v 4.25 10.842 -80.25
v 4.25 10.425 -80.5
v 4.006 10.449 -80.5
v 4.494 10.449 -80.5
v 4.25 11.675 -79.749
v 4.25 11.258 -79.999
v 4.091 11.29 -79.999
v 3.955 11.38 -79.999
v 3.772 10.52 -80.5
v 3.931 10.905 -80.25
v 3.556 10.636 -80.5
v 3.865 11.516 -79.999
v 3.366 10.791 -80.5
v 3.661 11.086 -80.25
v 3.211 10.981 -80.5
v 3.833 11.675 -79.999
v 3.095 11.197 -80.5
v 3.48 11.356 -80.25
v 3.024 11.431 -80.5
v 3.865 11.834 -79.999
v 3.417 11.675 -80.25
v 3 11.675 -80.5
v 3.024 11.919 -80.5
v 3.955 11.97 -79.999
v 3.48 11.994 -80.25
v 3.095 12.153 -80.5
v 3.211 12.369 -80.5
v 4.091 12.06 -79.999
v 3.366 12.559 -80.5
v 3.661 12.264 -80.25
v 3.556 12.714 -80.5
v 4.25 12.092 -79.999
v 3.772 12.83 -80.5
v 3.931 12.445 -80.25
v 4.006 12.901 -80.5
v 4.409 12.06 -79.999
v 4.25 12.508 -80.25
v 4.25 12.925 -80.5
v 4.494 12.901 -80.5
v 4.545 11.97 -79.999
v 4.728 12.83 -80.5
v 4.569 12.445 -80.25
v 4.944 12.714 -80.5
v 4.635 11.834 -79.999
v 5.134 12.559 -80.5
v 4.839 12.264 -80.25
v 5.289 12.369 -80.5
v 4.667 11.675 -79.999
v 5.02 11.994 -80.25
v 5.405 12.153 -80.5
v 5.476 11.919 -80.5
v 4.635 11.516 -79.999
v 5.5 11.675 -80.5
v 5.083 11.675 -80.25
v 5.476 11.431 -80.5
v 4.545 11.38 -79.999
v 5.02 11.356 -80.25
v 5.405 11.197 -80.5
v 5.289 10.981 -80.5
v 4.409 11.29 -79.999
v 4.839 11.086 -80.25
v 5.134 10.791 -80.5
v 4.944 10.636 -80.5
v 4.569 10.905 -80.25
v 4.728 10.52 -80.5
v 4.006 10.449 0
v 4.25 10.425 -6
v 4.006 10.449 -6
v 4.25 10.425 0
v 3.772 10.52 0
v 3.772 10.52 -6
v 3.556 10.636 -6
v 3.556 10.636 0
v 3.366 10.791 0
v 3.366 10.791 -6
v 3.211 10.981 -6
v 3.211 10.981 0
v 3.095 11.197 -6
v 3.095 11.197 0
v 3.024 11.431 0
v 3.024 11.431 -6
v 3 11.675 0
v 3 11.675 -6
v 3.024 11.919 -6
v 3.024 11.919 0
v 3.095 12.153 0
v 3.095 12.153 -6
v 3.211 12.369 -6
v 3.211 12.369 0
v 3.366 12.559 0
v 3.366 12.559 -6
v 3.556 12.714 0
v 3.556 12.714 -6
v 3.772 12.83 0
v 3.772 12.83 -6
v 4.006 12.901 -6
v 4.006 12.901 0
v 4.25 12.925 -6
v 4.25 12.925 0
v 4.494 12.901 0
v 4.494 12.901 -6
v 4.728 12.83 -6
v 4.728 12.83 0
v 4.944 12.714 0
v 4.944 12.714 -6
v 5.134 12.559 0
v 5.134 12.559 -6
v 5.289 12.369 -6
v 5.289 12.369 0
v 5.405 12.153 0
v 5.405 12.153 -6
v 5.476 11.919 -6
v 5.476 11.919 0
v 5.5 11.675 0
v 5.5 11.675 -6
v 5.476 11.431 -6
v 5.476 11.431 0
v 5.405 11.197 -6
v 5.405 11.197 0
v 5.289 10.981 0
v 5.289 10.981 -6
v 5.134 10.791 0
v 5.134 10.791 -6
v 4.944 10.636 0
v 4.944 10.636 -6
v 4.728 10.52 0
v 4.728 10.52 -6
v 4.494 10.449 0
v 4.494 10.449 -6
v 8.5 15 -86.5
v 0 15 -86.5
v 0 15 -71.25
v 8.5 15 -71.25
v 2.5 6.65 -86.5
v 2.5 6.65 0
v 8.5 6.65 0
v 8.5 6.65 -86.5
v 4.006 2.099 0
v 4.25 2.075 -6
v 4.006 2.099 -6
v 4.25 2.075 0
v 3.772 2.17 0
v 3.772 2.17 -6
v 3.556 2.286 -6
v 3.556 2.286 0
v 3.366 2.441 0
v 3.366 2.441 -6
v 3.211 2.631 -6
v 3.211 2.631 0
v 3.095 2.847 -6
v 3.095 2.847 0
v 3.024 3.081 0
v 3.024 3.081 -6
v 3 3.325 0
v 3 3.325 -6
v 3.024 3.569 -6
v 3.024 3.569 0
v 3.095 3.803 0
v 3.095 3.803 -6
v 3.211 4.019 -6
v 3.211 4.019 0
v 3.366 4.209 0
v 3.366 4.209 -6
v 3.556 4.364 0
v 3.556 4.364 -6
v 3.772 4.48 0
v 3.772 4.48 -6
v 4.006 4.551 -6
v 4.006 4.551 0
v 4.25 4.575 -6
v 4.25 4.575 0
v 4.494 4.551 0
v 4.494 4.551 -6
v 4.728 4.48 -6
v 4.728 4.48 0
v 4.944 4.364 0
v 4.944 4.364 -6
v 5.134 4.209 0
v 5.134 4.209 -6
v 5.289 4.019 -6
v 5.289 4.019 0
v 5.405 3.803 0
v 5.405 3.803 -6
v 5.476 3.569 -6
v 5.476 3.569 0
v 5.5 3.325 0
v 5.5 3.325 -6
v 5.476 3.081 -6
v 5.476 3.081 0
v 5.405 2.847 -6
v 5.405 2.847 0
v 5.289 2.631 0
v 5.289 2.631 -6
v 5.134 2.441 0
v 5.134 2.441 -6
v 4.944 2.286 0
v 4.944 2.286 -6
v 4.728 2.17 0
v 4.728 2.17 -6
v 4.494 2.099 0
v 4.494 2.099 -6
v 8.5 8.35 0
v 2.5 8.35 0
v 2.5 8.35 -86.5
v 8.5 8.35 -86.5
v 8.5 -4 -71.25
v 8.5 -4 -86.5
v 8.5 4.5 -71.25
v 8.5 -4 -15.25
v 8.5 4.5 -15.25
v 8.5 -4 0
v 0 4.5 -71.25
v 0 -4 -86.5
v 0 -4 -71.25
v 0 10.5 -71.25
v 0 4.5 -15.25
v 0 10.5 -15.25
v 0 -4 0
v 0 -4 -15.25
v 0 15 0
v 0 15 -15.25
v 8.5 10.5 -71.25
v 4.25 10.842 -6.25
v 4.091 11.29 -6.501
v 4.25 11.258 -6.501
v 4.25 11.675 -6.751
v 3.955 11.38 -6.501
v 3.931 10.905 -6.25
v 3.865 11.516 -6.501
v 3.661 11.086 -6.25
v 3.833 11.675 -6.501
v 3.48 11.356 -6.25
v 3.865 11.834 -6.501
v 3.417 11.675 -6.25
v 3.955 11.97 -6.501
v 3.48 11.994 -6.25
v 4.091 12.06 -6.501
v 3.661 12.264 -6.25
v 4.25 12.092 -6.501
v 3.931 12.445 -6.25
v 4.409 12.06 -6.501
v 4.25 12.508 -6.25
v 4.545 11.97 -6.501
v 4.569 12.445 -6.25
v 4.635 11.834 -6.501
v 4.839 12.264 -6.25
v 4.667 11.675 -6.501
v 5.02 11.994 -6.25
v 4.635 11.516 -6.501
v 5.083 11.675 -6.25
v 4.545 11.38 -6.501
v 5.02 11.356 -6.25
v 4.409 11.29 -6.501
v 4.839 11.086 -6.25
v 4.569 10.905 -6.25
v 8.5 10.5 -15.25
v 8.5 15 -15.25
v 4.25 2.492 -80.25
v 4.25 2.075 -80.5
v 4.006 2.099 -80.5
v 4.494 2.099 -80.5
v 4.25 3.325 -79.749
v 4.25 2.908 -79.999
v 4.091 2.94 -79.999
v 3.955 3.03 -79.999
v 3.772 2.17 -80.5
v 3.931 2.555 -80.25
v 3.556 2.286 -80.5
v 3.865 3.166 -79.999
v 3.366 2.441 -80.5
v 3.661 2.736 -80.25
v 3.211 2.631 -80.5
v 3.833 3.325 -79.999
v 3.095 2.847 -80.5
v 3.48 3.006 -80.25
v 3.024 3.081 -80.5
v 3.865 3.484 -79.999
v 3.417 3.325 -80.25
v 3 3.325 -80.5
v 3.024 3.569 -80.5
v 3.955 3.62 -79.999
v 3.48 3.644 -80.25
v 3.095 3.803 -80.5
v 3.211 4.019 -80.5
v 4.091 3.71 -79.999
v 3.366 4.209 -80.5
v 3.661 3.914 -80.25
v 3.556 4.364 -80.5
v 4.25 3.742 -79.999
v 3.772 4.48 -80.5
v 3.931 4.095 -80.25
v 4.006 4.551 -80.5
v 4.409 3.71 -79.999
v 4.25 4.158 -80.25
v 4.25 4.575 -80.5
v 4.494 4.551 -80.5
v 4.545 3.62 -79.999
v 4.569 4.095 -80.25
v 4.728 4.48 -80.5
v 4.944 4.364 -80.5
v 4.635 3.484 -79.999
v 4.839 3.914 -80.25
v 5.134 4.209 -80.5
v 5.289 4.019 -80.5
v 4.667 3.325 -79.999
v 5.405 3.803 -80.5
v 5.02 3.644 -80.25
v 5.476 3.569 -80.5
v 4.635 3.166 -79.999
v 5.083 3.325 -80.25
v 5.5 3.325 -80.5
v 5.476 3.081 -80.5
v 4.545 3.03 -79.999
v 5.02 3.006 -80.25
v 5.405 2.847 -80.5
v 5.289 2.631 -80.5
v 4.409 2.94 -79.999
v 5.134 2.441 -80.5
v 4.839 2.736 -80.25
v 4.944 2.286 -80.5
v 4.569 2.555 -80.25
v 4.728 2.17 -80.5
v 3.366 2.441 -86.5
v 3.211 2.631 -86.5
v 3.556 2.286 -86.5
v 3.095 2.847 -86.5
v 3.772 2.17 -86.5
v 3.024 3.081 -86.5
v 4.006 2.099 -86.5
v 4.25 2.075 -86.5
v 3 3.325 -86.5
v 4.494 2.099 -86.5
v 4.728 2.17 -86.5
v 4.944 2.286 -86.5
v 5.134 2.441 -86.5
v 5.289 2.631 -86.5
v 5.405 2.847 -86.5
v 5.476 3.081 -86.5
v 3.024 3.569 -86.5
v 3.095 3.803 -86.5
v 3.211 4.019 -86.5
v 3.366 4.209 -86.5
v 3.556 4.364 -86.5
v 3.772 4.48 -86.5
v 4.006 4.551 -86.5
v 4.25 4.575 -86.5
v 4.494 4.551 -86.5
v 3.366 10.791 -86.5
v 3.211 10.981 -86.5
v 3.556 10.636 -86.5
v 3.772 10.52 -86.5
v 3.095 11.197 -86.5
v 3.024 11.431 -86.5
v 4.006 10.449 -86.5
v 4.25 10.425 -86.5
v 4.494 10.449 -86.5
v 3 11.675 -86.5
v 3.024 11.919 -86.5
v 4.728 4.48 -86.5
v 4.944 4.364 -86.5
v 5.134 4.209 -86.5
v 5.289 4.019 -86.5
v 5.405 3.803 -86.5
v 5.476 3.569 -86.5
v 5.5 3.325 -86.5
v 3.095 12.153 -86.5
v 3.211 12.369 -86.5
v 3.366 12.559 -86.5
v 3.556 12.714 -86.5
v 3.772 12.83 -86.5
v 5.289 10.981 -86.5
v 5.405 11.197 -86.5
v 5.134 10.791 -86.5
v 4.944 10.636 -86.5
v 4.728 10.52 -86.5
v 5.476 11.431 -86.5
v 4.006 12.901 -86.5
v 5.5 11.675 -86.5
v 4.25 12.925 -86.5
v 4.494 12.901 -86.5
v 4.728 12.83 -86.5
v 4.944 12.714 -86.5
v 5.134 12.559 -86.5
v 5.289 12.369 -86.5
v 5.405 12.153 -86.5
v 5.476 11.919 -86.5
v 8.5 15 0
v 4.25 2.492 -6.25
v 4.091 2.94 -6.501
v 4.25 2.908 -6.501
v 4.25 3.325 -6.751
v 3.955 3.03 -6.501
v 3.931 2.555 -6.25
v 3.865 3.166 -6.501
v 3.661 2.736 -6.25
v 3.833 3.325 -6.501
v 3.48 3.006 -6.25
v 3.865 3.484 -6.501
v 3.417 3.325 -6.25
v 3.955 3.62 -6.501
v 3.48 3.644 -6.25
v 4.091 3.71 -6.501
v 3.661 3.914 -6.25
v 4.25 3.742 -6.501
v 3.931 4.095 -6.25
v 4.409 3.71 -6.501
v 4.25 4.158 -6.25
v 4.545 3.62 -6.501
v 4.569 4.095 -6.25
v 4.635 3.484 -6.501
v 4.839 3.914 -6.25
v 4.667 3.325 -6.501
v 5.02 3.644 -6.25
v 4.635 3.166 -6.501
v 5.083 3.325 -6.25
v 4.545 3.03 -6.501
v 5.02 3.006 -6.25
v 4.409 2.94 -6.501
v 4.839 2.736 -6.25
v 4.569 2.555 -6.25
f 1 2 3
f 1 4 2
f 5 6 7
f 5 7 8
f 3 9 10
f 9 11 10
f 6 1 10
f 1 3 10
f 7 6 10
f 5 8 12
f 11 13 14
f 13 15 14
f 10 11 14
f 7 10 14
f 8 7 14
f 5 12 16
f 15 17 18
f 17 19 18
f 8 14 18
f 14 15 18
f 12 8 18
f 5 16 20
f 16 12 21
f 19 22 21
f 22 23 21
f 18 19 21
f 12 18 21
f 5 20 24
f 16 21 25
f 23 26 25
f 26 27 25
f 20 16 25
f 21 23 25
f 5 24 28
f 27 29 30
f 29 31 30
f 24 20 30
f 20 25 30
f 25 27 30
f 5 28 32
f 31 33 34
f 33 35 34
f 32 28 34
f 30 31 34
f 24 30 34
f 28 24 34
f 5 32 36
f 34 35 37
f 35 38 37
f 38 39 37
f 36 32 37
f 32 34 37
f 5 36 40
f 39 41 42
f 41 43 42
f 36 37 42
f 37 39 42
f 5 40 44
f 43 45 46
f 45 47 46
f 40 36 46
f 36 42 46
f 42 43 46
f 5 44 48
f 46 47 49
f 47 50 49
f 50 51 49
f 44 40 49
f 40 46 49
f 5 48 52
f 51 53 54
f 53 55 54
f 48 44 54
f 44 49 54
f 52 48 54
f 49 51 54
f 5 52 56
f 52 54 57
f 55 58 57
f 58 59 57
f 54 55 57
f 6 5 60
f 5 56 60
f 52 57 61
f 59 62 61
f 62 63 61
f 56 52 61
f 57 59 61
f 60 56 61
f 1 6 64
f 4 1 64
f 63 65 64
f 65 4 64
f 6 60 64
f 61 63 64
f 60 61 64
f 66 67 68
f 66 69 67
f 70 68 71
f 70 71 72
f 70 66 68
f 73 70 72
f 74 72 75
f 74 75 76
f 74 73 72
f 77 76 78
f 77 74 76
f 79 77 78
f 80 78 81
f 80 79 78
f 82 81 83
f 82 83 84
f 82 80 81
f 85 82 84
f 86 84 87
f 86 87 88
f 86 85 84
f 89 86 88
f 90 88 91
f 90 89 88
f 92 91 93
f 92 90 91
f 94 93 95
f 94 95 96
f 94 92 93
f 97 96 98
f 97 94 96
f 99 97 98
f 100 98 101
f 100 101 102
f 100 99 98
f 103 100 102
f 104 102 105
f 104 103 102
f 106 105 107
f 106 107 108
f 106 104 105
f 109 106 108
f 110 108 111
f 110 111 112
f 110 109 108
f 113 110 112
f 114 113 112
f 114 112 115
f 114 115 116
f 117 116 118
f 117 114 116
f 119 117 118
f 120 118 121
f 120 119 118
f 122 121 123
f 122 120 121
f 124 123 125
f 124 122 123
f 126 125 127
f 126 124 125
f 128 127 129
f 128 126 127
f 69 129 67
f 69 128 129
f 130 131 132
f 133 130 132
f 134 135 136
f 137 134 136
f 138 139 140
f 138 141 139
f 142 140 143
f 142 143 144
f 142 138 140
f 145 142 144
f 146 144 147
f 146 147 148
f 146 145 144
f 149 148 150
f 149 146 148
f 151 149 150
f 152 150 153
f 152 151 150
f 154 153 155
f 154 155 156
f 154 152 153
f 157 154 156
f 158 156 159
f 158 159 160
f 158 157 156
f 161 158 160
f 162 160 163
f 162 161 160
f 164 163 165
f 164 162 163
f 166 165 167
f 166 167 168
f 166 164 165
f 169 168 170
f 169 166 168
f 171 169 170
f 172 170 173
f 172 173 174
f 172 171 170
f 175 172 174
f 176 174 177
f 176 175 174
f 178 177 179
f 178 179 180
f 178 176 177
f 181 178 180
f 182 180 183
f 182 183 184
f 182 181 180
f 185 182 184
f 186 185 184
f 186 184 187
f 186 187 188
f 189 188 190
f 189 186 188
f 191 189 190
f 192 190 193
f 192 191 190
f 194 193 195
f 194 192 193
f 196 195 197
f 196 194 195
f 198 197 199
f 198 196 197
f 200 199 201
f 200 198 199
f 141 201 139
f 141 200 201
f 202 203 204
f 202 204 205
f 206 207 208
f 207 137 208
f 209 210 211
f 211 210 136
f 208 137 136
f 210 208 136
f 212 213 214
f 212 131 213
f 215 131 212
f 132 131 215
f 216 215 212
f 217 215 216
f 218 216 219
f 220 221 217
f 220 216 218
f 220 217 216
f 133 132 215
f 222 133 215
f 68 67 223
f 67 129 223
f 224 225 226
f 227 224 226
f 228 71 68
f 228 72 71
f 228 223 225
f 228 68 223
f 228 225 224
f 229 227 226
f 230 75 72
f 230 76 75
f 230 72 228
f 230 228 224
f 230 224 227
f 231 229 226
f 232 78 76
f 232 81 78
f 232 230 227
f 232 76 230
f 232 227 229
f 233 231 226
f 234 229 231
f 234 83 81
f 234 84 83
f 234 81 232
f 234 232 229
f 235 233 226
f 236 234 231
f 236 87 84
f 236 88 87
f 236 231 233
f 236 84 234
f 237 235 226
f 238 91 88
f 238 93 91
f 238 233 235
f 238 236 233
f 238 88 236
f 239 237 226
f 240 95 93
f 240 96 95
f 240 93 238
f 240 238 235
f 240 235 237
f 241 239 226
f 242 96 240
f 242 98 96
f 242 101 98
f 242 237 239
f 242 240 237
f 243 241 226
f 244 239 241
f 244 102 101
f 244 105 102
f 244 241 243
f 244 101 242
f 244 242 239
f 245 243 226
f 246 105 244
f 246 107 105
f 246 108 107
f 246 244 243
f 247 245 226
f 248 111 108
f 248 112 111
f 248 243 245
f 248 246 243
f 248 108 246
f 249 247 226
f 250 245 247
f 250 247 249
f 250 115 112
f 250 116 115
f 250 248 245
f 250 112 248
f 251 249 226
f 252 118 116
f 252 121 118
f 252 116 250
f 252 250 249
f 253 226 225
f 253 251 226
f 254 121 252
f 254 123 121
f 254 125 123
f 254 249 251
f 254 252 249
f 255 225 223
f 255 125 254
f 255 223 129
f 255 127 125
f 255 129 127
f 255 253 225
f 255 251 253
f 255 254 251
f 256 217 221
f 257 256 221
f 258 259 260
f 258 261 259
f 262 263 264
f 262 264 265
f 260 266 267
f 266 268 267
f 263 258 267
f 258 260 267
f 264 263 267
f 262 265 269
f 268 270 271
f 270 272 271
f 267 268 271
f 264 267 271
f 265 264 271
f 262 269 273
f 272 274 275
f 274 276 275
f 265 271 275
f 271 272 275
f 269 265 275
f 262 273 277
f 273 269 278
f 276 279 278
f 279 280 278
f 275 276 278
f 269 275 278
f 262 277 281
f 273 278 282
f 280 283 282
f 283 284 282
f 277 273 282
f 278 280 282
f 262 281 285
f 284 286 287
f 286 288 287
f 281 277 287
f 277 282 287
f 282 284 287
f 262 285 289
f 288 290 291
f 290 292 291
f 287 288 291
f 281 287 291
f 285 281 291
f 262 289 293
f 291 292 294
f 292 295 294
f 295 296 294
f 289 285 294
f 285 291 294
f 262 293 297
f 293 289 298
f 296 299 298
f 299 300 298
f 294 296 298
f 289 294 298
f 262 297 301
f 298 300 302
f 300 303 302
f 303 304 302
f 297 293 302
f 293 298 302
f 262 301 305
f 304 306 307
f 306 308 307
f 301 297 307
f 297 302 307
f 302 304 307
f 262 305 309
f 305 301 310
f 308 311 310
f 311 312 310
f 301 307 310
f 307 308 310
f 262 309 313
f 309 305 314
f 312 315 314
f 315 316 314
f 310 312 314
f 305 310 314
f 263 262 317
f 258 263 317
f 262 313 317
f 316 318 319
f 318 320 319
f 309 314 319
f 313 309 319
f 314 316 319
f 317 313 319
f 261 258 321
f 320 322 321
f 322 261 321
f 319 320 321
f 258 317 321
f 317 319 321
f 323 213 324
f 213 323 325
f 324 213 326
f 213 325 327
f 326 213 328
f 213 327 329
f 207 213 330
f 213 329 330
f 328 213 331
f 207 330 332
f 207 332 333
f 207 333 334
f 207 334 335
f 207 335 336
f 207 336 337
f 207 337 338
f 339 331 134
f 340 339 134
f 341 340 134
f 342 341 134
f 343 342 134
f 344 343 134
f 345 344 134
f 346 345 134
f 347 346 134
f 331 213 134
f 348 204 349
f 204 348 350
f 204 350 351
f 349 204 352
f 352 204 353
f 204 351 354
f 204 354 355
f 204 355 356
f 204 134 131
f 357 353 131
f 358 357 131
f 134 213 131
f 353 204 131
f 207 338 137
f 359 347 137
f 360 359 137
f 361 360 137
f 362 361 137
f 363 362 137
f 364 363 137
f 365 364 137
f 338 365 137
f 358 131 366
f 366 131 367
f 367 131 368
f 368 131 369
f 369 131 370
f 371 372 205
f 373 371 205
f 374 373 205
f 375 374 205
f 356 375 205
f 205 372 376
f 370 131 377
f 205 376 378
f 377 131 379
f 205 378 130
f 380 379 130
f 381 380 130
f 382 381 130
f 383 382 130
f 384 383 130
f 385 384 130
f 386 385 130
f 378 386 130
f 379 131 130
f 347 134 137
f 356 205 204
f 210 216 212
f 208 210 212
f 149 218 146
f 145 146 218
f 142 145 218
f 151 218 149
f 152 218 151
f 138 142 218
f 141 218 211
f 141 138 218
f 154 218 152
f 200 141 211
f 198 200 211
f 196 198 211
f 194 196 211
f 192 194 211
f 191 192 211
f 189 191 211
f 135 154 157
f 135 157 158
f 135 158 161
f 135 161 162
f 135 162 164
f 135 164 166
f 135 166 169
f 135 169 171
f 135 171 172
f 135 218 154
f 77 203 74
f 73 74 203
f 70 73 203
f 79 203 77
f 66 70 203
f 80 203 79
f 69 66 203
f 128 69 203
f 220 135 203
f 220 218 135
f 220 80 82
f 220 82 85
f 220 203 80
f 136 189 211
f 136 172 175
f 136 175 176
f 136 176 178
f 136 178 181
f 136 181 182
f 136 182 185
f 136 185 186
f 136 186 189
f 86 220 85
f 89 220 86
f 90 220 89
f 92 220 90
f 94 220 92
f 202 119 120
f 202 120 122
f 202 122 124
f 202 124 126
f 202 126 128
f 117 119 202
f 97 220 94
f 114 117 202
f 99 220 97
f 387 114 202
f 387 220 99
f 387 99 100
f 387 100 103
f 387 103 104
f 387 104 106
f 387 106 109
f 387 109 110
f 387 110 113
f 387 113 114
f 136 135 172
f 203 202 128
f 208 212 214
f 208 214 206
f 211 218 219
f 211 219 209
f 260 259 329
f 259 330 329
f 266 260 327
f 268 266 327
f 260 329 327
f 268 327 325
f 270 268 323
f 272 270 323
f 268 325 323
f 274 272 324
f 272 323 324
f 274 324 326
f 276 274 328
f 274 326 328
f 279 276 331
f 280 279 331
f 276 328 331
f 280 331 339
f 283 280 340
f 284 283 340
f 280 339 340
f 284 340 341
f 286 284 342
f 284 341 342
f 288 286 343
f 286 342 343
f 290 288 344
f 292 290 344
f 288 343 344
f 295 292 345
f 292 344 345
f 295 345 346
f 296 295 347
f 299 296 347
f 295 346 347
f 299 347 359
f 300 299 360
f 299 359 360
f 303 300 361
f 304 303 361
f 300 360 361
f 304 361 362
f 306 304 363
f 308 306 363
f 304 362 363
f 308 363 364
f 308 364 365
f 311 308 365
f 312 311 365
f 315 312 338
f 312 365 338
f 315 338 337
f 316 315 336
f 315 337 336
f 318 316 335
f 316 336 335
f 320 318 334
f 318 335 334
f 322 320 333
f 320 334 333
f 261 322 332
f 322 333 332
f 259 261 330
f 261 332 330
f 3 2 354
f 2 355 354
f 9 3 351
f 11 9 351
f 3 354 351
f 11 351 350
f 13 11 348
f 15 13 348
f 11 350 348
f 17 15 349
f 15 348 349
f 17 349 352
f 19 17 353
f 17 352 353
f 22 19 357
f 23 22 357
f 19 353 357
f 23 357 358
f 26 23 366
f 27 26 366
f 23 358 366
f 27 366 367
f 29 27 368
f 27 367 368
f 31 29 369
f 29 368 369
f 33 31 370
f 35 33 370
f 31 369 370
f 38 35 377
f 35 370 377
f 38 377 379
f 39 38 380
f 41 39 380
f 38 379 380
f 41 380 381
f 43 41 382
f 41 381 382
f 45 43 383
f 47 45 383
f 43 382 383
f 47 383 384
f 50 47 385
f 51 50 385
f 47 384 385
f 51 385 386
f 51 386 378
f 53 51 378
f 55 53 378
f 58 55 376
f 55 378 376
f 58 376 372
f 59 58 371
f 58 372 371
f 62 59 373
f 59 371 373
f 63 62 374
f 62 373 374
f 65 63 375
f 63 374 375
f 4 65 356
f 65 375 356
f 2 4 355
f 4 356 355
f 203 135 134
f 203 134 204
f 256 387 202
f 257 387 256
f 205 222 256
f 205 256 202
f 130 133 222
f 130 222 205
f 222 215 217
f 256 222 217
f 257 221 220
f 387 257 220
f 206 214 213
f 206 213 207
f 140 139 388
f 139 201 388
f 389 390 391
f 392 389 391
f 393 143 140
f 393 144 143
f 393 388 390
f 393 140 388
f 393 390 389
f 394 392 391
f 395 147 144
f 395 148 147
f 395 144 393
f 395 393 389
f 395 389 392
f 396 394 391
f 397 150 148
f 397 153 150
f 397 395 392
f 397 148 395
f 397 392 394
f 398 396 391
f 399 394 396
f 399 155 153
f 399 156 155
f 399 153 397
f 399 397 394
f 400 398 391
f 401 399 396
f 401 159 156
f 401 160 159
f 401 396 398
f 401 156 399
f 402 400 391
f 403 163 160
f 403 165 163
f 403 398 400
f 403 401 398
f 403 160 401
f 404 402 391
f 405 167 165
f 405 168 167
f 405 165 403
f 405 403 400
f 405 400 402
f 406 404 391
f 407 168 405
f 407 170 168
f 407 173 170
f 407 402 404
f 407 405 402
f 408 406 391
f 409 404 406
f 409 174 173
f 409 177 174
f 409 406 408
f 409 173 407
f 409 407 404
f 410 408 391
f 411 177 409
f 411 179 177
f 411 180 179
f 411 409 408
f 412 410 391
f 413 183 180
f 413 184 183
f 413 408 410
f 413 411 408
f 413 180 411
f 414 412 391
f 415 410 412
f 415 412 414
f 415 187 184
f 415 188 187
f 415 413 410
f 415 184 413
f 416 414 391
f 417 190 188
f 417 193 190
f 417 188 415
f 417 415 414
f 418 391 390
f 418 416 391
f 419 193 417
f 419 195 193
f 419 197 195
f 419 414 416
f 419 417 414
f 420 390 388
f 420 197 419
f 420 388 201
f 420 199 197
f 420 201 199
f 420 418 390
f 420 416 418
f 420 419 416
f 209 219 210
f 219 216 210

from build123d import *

# Parameters (mm, degrees)
BOSS_EXTRUDE2_DEPTH            = 8.5
SKETCH6_W                      = 6
SKETCH6_H                      = 1.7
CUT_EXTRUDE3_DEPTH             = 87.5
M3X0_5_TAPPED_HOLE4_AT_2_COUNT = 2
M3X0_5_TAPPED_HOLE4_AT_2_PITCH = 8.35
SKETCH20_W                     = 8.5
SKETCH20_H                     = 15.25
BOSS_EXTRUDE3_DEPTH            = 4
SKETCH23_W                     = 8.5
SKETCH23_H                     = 15.25
BOSS_EXTRUDE4_DEPTH            = 4


with BuildPart() as part:
    # Sketch5 → Boss-Extrude2 (new body)
    with BuildSketch(Plane(origin=(0, 0, 0), x_dir=(0, 0, -1), z_dir=(1, 0, 0))):
        Polygon((0, 0), (15.25, 0), (15.25, 4.5), (71.25, 4.5), (71.25, 0), (86.5, 0), (86.5, 15), (71.25, 15), (71.25, 10.5), (15.25, 10.5), (15.25, 15), (0, 15), align=None)
    extrude(amount=BOSS_EXTRUDE2_DEPTH)

    # Sketch6 → Cut-Extrude3 (cut, through all)
    with BuildSketch(Plane.XY):
        with Locations((5.5, 7.5)):
            Rectangle(SKETCH6_W, SKETCH6_H)
    extrude(amount=-CUT_EXTRUDE3_DEPTH, mode=Mode.SUBTRACT)

    # Sketch18 → M3x0.5 Tapped Hole4 (revolve, cut)
    with BuildSketch(Plane(origin=(4.25, 3.325, 0), x_dir=(0, -1, 0), z_dir=(1, 0, 0))):
        Polygon((0, 0), (0, 6.751075774), (1.25, 6), (1.25, 0), align=None)
    m3x0_5_tapped_hole4 = revolve(axis=Axis((4.25, 3.325, 6.35), (0, 0, -1)), mode=Mode.SUBTRACT)

    # M3x0.5 Tapped Hole4 at 2: M3x0.5 Tapped Hole4 ×2
    with Locations(*[(0, i * M3X0_5_TAPPED_HOLE4_AT_2_PITCH, 0) for i in range(1, M3X0_5_TAPPED_HOLE4_AT_2_COUNT)]):
        add(m3x0_5_tapped_hole4, mode=Mode.SUBTRACT)

    # Mirror3: M3x0.5 Tapped Hole4 across plane
    add(m3x0_5_tapped_hole4.mirror(Plane(origin=(0, 0, -43.25), x_dir=(1, 0, 0), z_dir=(0, 0, -1))), mode=Mode.SUBTRACT)

    # Mirror3 copy 1 sketch → Mirror3 copy 1 (revolve, cut)
    with BuildSketch(Plane(origin=(4.25, 11.675, -86.5), x_dir=(0, -1, 0), z_dir=(1, 0, 0))):
        Polygon((0, 0), (0, -6.751075774), (1.25, -6), (1.25, 0), align=None)
    revolve(axis=Axis((4.25, 11.675, -92.85), (0, 0, -1)), mode=Mode.SUBTRACT)

    # Sketch20 → Boss-Extrude3 (add)
    with BuildSketch(Plane.XZ):
        with Locations((4.25, -7.625)):
            Rectangle(SKETCH20_W, SKETCH20_H)
    extrude(amount=BOSS_EXTRUDE3_DEPTH)

    # Sketch23 → Boss-Extrude4 (add)
    with BuildSketch(Plane.XZ):
        with Locations((4.25, -78.875)):
            Rectangle(SKETCH23_W, SKETCH23_H)
    extrude(amount=BOSS_EXTRUDE4_DEPTH)


solid = part.part
